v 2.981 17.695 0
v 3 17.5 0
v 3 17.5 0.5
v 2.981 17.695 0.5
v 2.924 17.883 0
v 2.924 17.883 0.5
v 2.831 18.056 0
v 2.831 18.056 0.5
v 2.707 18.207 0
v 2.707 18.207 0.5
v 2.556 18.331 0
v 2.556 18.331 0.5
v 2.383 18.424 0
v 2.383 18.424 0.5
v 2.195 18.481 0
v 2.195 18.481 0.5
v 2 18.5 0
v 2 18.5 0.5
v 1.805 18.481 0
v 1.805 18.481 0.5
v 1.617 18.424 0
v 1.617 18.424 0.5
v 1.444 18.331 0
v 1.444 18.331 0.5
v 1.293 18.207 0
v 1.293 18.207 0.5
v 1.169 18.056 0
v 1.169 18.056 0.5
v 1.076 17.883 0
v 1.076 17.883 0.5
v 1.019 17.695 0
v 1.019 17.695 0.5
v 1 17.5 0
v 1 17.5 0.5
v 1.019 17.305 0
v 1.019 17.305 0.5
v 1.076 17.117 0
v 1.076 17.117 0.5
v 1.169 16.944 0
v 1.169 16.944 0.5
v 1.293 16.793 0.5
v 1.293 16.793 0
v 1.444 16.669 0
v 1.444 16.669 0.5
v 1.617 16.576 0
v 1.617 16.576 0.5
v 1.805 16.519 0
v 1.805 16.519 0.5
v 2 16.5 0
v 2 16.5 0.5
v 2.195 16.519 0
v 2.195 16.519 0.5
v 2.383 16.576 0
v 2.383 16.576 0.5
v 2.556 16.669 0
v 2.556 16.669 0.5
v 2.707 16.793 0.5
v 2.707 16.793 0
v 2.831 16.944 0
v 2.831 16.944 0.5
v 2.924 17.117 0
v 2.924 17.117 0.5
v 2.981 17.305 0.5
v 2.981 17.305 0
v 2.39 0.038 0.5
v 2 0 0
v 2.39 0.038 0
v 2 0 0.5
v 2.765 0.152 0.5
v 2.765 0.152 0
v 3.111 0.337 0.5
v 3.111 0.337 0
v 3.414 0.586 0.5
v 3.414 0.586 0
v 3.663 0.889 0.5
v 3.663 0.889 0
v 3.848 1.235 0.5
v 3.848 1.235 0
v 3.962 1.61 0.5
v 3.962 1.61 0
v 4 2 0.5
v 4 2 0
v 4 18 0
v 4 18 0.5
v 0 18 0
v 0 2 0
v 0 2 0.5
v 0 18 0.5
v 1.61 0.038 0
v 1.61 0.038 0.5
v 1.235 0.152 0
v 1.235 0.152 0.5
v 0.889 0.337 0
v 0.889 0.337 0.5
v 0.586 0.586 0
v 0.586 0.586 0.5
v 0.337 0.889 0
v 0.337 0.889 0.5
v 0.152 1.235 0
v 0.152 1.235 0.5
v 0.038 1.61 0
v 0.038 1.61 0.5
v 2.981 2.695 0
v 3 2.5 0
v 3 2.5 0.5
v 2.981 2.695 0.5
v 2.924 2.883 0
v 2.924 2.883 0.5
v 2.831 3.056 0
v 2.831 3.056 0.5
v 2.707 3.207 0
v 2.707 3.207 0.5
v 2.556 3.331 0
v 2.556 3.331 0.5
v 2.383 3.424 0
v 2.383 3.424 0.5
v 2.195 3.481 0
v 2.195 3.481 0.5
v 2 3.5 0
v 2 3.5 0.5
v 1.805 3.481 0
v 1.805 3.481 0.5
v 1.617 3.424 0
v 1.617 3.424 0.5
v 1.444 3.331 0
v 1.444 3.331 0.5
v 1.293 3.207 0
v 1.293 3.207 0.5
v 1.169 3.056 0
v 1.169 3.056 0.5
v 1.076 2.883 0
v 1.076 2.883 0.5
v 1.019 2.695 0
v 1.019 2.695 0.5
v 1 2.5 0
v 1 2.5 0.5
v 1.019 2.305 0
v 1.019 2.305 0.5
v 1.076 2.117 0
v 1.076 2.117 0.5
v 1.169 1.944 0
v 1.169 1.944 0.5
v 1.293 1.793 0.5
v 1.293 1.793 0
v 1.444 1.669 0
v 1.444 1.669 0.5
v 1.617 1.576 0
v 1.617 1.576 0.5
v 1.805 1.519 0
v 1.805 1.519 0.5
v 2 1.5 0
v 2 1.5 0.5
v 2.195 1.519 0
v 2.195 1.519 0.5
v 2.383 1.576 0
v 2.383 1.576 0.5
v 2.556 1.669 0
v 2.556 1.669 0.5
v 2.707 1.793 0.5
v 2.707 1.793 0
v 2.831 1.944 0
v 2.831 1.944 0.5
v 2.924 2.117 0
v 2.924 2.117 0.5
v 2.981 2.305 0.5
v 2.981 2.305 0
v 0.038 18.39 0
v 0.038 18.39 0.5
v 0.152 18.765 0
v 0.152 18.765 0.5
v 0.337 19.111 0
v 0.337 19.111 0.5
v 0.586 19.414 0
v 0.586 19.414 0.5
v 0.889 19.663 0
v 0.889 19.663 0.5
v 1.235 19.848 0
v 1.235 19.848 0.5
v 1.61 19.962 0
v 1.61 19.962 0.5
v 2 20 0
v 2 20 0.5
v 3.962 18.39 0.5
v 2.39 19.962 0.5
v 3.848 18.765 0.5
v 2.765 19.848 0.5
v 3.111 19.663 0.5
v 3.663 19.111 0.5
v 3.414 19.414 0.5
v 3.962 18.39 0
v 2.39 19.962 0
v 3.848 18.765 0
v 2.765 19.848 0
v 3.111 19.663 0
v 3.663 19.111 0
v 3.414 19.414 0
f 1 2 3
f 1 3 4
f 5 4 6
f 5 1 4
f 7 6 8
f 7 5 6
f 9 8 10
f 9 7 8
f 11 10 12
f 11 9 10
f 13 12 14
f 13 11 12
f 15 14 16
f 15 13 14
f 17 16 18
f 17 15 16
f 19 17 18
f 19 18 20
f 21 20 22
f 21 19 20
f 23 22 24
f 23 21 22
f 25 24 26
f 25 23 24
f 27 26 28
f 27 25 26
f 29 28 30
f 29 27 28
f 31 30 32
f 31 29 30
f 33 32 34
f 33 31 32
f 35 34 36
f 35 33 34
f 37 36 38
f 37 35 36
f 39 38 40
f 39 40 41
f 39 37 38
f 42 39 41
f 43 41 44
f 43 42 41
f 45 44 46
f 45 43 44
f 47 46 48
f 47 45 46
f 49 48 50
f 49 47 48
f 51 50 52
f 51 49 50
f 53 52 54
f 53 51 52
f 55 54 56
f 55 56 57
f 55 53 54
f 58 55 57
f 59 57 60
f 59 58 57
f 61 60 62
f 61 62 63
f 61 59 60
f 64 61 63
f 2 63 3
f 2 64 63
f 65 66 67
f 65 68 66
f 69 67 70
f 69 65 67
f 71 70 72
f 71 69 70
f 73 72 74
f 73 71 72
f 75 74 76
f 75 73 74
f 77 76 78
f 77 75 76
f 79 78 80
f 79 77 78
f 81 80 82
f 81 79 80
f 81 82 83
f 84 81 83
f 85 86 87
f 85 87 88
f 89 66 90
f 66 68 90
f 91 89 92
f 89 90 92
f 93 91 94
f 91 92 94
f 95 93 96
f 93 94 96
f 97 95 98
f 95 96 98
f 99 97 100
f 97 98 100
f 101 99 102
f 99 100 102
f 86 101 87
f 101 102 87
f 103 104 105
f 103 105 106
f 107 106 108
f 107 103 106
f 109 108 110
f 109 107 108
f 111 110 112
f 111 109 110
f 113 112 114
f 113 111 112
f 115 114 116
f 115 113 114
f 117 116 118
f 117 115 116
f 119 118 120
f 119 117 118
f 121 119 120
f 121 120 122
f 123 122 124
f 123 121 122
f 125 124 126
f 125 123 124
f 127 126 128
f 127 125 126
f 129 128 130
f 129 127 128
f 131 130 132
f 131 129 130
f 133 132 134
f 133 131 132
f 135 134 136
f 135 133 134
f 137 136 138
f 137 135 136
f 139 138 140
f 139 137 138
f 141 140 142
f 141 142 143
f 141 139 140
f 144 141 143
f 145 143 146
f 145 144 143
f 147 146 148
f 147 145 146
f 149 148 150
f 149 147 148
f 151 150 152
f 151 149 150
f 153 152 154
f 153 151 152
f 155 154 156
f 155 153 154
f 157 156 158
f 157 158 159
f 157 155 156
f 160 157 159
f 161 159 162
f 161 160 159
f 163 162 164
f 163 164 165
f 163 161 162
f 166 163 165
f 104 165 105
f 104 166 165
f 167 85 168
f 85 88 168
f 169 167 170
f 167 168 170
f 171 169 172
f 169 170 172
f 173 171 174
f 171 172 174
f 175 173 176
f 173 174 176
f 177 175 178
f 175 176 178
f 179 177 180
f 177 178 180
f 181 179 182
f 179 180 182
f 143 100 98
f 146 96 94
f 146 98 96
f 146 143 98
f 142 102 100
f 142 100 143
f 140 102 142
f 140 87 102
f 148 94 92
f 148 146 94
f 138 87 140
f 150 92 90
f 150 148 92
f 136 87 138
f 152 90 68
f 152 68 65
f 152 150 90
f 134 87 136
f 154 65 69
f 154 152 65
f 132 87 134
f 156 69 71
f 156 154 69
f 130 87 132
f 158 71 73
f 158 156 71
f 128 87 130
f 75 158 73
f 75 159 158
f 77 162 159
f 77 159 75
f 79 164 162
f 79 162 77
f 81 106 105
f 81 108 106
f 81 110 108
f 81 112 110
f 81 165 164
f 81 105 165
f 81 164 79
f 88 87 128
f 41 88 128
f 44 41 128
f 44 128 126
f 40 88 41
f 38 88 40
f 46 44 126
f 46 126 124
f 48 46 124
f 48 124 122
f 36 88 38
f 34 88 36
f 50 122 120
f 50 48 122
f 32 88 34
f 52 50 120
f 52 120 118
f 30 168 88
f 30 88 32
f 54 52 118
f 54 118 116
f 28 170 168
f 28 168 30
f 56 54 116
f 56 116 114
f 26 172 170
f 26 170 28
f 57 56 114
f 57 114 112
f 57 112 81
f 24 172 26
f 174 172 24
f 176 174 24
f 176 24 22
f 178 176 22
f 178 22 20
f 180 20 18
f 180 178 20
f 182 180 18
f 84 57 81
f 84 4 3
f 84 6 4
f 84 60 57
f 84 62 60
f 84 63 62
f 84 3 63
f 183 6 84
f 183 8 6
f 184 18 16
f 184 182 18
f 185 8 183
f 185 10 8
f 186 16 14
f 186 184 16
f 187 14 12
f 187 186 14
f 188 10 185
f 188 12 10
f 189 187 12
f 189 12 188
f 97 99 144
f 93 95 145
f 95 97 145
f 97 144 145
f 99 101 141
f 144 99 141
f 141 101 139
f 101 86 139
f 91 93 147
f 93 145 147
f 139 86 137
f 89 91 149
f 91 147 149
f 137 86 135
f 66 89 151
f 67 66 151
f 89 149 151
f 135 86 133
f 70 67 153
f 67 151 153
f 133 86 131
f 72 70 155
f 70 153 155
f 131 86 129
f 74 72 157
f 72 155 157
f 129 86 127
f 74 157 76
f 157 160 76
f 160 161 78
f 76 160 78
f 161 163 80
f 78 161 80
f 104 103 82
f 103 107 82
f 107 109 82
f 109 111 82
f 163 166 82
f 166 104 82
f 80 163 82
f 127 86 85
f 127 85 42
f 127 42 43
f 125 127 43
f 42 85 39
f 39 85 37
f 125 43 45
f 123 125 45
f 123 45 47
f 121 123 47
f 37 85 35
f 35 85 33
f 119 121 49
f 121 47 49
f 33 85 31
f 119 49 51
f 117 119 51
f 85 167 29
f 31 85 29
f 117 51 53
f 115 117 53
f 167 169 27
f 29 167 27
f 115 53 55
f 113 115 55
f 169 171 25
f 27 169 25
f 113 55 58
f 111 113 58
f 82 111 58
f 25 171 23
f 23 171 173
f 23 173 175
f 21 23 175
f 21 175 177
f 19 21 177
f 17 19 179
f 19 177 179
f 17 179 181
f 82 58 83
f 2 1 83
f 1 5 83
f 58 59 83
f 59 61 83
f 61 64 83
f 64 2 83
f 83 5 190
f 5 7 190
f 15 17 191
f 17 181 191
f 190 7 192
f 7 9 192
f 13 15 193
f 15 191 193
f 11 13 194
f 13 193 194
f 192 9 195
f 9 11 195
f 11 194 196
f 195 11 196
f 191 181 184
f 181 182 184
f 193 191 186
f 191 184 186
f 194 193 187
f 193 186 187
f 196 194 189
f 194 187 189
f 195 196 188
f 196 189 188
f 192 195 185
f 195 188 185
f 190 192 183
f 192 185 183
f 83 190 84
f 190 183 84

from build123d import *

# Parameters (mm, degrees)
SKETCH1_W           = 4
SKETCH1_H           = 20
SKETCH1_R           = 1
BOSS_EXTRUDE1_DEPTH = 0.5
FILLET1_R           = 2
FILLET2_R           = 2
FILLET3_R           = 2
FILLET4_R           = 2


with BuildPart() as part:
    # Sketch1 → Boss-Extrude1 (new body)
    with BuildSketch(Plane.XY):
        with Locations((2, 10)):
            Rectangle(SKETCH1_W, SKETCH1_H)
        with Locations((2, 17.5)):
            Circle(SKETCH1_R, mode=Mode.SUBTRACT)
        with Locations((2, 2.5)):
            Circle(SKETCH1_R, mode=Mode.SUBTRACT)
    extrude(amount=BOSS_EXTRUDE1_DEPTH)

    # Fillet1
    fillet1_edges = [part.edges().sort_by_distance(p)[0] for p in [
        (4, 0, 0.25),
    ]]
    fillet(fillet1_edges, radius=FILLET1_R)

    # Fillet2
    fillet2_edges = [part.edges().sort_by_distance(p)[0] for p in [
        (0, 0, 0.25),
    ]]
    fillet(fillet2_edges, radius=FILLET2_R - 0.0001)  # a hair under: the kernel refuses the full size

    # Fillet3
    fillet3_edges = [part.edges().sort_by_distance(p)[0] for p in [
        (0, 20, 0.25),
    ]]
    fillet(fillet3_edges, radius=FILLET3_R)

    # Fillet4
    fillet4_edges = [part.edges().sort_by_distance(p)[0] for p in [
        (4, 20, 0.25),
    ]]
    fillet(fillet4_edges, radius=FILLET4_R - 0.0001)  # a hair under: the kernel refuses the full size


solid = part.part
